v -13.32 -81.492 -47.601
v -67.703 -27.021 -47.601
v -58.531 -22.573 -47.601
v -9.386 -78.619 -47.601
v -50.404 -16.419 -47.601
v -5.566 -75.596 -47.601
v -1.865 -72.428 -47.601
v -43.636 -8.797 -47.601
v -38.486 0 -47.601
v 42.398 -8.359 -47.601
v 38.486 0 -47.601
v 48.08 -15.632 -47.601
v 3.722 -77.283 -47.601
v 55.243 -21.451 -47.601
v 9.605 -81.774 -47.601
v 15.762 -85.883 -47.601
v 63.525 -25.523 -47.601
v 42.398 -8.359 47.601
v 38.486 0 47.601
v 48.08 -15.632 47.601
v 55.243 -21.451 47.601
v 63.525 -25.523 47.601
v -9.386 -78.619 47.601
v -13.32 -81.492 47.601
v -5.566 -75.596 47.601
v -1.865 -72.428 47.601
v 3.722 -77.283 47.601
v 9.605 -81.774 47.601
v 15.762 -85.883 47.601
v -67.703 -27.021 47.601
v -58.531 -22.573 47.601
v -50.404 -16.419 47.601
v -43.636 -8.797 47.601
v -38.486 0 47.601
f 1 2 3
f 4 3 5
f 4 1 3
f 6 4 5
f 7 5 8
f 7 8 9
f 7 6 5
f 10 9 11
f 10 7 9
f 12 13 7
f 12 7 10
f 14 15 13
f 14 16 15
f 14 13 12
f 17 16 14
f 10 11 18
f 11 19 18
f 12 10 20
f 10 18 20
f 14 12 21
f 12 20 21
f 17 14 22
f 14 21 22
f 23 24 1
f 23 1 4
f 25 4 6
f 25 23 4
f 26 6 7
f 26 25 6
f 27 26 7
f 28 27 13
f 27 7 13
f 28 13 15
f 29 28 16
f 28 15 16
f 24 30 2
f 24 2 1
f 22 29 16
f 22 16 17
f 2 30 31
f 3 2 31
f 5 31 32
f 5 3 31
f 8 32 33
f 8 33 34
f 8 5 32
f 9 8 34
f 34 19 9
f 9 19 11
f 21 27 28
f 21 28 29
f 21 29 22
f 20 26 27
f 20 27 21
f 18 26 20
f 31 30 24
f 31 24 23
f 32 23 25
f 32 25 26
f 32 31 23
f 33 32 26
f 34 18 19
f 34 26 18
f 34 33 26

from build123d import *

# Parameters (mm, degrees)
F0_W = 76.971642673
F0_H = 95.2017754316


# Not quite as in the source:
# - a feature names something its author has since deleted; it is built from what else it names
# - the program builds the solid bodies; features that only make, move or delete a surface that nothing else refers to are left out


with BuildPart() as f2:
    # F2: sweep along a path in F1
    with BuildLine(Plane.XY) as f2_path:
        ThreePointArc((0, 0), (13.4369935077, -32.3954640503), (39.643291384, -55.703163147))
    # F0 (on Front) → F2 (sweep)
    with BuildSketch(Plane.XZ):
        Rectangle(F0_W, F0_H)
    sweep(path=f2_path.line)

    # F3: sweep along a path in F1
    with BuildLine(Plane.XY) as f3_path:
        ThreePointArc((-40.5113920569, -54.2563311756), (-14.8539477386, -31.1614707896), (0, 0))
    # F0 (on Front) → F3 (sweep)
    with BuildSketch(Plane.XZ):
        Rectangle(F0_W, F0_H)
    sweep(path=f3_path.line)


solid = f2.part
